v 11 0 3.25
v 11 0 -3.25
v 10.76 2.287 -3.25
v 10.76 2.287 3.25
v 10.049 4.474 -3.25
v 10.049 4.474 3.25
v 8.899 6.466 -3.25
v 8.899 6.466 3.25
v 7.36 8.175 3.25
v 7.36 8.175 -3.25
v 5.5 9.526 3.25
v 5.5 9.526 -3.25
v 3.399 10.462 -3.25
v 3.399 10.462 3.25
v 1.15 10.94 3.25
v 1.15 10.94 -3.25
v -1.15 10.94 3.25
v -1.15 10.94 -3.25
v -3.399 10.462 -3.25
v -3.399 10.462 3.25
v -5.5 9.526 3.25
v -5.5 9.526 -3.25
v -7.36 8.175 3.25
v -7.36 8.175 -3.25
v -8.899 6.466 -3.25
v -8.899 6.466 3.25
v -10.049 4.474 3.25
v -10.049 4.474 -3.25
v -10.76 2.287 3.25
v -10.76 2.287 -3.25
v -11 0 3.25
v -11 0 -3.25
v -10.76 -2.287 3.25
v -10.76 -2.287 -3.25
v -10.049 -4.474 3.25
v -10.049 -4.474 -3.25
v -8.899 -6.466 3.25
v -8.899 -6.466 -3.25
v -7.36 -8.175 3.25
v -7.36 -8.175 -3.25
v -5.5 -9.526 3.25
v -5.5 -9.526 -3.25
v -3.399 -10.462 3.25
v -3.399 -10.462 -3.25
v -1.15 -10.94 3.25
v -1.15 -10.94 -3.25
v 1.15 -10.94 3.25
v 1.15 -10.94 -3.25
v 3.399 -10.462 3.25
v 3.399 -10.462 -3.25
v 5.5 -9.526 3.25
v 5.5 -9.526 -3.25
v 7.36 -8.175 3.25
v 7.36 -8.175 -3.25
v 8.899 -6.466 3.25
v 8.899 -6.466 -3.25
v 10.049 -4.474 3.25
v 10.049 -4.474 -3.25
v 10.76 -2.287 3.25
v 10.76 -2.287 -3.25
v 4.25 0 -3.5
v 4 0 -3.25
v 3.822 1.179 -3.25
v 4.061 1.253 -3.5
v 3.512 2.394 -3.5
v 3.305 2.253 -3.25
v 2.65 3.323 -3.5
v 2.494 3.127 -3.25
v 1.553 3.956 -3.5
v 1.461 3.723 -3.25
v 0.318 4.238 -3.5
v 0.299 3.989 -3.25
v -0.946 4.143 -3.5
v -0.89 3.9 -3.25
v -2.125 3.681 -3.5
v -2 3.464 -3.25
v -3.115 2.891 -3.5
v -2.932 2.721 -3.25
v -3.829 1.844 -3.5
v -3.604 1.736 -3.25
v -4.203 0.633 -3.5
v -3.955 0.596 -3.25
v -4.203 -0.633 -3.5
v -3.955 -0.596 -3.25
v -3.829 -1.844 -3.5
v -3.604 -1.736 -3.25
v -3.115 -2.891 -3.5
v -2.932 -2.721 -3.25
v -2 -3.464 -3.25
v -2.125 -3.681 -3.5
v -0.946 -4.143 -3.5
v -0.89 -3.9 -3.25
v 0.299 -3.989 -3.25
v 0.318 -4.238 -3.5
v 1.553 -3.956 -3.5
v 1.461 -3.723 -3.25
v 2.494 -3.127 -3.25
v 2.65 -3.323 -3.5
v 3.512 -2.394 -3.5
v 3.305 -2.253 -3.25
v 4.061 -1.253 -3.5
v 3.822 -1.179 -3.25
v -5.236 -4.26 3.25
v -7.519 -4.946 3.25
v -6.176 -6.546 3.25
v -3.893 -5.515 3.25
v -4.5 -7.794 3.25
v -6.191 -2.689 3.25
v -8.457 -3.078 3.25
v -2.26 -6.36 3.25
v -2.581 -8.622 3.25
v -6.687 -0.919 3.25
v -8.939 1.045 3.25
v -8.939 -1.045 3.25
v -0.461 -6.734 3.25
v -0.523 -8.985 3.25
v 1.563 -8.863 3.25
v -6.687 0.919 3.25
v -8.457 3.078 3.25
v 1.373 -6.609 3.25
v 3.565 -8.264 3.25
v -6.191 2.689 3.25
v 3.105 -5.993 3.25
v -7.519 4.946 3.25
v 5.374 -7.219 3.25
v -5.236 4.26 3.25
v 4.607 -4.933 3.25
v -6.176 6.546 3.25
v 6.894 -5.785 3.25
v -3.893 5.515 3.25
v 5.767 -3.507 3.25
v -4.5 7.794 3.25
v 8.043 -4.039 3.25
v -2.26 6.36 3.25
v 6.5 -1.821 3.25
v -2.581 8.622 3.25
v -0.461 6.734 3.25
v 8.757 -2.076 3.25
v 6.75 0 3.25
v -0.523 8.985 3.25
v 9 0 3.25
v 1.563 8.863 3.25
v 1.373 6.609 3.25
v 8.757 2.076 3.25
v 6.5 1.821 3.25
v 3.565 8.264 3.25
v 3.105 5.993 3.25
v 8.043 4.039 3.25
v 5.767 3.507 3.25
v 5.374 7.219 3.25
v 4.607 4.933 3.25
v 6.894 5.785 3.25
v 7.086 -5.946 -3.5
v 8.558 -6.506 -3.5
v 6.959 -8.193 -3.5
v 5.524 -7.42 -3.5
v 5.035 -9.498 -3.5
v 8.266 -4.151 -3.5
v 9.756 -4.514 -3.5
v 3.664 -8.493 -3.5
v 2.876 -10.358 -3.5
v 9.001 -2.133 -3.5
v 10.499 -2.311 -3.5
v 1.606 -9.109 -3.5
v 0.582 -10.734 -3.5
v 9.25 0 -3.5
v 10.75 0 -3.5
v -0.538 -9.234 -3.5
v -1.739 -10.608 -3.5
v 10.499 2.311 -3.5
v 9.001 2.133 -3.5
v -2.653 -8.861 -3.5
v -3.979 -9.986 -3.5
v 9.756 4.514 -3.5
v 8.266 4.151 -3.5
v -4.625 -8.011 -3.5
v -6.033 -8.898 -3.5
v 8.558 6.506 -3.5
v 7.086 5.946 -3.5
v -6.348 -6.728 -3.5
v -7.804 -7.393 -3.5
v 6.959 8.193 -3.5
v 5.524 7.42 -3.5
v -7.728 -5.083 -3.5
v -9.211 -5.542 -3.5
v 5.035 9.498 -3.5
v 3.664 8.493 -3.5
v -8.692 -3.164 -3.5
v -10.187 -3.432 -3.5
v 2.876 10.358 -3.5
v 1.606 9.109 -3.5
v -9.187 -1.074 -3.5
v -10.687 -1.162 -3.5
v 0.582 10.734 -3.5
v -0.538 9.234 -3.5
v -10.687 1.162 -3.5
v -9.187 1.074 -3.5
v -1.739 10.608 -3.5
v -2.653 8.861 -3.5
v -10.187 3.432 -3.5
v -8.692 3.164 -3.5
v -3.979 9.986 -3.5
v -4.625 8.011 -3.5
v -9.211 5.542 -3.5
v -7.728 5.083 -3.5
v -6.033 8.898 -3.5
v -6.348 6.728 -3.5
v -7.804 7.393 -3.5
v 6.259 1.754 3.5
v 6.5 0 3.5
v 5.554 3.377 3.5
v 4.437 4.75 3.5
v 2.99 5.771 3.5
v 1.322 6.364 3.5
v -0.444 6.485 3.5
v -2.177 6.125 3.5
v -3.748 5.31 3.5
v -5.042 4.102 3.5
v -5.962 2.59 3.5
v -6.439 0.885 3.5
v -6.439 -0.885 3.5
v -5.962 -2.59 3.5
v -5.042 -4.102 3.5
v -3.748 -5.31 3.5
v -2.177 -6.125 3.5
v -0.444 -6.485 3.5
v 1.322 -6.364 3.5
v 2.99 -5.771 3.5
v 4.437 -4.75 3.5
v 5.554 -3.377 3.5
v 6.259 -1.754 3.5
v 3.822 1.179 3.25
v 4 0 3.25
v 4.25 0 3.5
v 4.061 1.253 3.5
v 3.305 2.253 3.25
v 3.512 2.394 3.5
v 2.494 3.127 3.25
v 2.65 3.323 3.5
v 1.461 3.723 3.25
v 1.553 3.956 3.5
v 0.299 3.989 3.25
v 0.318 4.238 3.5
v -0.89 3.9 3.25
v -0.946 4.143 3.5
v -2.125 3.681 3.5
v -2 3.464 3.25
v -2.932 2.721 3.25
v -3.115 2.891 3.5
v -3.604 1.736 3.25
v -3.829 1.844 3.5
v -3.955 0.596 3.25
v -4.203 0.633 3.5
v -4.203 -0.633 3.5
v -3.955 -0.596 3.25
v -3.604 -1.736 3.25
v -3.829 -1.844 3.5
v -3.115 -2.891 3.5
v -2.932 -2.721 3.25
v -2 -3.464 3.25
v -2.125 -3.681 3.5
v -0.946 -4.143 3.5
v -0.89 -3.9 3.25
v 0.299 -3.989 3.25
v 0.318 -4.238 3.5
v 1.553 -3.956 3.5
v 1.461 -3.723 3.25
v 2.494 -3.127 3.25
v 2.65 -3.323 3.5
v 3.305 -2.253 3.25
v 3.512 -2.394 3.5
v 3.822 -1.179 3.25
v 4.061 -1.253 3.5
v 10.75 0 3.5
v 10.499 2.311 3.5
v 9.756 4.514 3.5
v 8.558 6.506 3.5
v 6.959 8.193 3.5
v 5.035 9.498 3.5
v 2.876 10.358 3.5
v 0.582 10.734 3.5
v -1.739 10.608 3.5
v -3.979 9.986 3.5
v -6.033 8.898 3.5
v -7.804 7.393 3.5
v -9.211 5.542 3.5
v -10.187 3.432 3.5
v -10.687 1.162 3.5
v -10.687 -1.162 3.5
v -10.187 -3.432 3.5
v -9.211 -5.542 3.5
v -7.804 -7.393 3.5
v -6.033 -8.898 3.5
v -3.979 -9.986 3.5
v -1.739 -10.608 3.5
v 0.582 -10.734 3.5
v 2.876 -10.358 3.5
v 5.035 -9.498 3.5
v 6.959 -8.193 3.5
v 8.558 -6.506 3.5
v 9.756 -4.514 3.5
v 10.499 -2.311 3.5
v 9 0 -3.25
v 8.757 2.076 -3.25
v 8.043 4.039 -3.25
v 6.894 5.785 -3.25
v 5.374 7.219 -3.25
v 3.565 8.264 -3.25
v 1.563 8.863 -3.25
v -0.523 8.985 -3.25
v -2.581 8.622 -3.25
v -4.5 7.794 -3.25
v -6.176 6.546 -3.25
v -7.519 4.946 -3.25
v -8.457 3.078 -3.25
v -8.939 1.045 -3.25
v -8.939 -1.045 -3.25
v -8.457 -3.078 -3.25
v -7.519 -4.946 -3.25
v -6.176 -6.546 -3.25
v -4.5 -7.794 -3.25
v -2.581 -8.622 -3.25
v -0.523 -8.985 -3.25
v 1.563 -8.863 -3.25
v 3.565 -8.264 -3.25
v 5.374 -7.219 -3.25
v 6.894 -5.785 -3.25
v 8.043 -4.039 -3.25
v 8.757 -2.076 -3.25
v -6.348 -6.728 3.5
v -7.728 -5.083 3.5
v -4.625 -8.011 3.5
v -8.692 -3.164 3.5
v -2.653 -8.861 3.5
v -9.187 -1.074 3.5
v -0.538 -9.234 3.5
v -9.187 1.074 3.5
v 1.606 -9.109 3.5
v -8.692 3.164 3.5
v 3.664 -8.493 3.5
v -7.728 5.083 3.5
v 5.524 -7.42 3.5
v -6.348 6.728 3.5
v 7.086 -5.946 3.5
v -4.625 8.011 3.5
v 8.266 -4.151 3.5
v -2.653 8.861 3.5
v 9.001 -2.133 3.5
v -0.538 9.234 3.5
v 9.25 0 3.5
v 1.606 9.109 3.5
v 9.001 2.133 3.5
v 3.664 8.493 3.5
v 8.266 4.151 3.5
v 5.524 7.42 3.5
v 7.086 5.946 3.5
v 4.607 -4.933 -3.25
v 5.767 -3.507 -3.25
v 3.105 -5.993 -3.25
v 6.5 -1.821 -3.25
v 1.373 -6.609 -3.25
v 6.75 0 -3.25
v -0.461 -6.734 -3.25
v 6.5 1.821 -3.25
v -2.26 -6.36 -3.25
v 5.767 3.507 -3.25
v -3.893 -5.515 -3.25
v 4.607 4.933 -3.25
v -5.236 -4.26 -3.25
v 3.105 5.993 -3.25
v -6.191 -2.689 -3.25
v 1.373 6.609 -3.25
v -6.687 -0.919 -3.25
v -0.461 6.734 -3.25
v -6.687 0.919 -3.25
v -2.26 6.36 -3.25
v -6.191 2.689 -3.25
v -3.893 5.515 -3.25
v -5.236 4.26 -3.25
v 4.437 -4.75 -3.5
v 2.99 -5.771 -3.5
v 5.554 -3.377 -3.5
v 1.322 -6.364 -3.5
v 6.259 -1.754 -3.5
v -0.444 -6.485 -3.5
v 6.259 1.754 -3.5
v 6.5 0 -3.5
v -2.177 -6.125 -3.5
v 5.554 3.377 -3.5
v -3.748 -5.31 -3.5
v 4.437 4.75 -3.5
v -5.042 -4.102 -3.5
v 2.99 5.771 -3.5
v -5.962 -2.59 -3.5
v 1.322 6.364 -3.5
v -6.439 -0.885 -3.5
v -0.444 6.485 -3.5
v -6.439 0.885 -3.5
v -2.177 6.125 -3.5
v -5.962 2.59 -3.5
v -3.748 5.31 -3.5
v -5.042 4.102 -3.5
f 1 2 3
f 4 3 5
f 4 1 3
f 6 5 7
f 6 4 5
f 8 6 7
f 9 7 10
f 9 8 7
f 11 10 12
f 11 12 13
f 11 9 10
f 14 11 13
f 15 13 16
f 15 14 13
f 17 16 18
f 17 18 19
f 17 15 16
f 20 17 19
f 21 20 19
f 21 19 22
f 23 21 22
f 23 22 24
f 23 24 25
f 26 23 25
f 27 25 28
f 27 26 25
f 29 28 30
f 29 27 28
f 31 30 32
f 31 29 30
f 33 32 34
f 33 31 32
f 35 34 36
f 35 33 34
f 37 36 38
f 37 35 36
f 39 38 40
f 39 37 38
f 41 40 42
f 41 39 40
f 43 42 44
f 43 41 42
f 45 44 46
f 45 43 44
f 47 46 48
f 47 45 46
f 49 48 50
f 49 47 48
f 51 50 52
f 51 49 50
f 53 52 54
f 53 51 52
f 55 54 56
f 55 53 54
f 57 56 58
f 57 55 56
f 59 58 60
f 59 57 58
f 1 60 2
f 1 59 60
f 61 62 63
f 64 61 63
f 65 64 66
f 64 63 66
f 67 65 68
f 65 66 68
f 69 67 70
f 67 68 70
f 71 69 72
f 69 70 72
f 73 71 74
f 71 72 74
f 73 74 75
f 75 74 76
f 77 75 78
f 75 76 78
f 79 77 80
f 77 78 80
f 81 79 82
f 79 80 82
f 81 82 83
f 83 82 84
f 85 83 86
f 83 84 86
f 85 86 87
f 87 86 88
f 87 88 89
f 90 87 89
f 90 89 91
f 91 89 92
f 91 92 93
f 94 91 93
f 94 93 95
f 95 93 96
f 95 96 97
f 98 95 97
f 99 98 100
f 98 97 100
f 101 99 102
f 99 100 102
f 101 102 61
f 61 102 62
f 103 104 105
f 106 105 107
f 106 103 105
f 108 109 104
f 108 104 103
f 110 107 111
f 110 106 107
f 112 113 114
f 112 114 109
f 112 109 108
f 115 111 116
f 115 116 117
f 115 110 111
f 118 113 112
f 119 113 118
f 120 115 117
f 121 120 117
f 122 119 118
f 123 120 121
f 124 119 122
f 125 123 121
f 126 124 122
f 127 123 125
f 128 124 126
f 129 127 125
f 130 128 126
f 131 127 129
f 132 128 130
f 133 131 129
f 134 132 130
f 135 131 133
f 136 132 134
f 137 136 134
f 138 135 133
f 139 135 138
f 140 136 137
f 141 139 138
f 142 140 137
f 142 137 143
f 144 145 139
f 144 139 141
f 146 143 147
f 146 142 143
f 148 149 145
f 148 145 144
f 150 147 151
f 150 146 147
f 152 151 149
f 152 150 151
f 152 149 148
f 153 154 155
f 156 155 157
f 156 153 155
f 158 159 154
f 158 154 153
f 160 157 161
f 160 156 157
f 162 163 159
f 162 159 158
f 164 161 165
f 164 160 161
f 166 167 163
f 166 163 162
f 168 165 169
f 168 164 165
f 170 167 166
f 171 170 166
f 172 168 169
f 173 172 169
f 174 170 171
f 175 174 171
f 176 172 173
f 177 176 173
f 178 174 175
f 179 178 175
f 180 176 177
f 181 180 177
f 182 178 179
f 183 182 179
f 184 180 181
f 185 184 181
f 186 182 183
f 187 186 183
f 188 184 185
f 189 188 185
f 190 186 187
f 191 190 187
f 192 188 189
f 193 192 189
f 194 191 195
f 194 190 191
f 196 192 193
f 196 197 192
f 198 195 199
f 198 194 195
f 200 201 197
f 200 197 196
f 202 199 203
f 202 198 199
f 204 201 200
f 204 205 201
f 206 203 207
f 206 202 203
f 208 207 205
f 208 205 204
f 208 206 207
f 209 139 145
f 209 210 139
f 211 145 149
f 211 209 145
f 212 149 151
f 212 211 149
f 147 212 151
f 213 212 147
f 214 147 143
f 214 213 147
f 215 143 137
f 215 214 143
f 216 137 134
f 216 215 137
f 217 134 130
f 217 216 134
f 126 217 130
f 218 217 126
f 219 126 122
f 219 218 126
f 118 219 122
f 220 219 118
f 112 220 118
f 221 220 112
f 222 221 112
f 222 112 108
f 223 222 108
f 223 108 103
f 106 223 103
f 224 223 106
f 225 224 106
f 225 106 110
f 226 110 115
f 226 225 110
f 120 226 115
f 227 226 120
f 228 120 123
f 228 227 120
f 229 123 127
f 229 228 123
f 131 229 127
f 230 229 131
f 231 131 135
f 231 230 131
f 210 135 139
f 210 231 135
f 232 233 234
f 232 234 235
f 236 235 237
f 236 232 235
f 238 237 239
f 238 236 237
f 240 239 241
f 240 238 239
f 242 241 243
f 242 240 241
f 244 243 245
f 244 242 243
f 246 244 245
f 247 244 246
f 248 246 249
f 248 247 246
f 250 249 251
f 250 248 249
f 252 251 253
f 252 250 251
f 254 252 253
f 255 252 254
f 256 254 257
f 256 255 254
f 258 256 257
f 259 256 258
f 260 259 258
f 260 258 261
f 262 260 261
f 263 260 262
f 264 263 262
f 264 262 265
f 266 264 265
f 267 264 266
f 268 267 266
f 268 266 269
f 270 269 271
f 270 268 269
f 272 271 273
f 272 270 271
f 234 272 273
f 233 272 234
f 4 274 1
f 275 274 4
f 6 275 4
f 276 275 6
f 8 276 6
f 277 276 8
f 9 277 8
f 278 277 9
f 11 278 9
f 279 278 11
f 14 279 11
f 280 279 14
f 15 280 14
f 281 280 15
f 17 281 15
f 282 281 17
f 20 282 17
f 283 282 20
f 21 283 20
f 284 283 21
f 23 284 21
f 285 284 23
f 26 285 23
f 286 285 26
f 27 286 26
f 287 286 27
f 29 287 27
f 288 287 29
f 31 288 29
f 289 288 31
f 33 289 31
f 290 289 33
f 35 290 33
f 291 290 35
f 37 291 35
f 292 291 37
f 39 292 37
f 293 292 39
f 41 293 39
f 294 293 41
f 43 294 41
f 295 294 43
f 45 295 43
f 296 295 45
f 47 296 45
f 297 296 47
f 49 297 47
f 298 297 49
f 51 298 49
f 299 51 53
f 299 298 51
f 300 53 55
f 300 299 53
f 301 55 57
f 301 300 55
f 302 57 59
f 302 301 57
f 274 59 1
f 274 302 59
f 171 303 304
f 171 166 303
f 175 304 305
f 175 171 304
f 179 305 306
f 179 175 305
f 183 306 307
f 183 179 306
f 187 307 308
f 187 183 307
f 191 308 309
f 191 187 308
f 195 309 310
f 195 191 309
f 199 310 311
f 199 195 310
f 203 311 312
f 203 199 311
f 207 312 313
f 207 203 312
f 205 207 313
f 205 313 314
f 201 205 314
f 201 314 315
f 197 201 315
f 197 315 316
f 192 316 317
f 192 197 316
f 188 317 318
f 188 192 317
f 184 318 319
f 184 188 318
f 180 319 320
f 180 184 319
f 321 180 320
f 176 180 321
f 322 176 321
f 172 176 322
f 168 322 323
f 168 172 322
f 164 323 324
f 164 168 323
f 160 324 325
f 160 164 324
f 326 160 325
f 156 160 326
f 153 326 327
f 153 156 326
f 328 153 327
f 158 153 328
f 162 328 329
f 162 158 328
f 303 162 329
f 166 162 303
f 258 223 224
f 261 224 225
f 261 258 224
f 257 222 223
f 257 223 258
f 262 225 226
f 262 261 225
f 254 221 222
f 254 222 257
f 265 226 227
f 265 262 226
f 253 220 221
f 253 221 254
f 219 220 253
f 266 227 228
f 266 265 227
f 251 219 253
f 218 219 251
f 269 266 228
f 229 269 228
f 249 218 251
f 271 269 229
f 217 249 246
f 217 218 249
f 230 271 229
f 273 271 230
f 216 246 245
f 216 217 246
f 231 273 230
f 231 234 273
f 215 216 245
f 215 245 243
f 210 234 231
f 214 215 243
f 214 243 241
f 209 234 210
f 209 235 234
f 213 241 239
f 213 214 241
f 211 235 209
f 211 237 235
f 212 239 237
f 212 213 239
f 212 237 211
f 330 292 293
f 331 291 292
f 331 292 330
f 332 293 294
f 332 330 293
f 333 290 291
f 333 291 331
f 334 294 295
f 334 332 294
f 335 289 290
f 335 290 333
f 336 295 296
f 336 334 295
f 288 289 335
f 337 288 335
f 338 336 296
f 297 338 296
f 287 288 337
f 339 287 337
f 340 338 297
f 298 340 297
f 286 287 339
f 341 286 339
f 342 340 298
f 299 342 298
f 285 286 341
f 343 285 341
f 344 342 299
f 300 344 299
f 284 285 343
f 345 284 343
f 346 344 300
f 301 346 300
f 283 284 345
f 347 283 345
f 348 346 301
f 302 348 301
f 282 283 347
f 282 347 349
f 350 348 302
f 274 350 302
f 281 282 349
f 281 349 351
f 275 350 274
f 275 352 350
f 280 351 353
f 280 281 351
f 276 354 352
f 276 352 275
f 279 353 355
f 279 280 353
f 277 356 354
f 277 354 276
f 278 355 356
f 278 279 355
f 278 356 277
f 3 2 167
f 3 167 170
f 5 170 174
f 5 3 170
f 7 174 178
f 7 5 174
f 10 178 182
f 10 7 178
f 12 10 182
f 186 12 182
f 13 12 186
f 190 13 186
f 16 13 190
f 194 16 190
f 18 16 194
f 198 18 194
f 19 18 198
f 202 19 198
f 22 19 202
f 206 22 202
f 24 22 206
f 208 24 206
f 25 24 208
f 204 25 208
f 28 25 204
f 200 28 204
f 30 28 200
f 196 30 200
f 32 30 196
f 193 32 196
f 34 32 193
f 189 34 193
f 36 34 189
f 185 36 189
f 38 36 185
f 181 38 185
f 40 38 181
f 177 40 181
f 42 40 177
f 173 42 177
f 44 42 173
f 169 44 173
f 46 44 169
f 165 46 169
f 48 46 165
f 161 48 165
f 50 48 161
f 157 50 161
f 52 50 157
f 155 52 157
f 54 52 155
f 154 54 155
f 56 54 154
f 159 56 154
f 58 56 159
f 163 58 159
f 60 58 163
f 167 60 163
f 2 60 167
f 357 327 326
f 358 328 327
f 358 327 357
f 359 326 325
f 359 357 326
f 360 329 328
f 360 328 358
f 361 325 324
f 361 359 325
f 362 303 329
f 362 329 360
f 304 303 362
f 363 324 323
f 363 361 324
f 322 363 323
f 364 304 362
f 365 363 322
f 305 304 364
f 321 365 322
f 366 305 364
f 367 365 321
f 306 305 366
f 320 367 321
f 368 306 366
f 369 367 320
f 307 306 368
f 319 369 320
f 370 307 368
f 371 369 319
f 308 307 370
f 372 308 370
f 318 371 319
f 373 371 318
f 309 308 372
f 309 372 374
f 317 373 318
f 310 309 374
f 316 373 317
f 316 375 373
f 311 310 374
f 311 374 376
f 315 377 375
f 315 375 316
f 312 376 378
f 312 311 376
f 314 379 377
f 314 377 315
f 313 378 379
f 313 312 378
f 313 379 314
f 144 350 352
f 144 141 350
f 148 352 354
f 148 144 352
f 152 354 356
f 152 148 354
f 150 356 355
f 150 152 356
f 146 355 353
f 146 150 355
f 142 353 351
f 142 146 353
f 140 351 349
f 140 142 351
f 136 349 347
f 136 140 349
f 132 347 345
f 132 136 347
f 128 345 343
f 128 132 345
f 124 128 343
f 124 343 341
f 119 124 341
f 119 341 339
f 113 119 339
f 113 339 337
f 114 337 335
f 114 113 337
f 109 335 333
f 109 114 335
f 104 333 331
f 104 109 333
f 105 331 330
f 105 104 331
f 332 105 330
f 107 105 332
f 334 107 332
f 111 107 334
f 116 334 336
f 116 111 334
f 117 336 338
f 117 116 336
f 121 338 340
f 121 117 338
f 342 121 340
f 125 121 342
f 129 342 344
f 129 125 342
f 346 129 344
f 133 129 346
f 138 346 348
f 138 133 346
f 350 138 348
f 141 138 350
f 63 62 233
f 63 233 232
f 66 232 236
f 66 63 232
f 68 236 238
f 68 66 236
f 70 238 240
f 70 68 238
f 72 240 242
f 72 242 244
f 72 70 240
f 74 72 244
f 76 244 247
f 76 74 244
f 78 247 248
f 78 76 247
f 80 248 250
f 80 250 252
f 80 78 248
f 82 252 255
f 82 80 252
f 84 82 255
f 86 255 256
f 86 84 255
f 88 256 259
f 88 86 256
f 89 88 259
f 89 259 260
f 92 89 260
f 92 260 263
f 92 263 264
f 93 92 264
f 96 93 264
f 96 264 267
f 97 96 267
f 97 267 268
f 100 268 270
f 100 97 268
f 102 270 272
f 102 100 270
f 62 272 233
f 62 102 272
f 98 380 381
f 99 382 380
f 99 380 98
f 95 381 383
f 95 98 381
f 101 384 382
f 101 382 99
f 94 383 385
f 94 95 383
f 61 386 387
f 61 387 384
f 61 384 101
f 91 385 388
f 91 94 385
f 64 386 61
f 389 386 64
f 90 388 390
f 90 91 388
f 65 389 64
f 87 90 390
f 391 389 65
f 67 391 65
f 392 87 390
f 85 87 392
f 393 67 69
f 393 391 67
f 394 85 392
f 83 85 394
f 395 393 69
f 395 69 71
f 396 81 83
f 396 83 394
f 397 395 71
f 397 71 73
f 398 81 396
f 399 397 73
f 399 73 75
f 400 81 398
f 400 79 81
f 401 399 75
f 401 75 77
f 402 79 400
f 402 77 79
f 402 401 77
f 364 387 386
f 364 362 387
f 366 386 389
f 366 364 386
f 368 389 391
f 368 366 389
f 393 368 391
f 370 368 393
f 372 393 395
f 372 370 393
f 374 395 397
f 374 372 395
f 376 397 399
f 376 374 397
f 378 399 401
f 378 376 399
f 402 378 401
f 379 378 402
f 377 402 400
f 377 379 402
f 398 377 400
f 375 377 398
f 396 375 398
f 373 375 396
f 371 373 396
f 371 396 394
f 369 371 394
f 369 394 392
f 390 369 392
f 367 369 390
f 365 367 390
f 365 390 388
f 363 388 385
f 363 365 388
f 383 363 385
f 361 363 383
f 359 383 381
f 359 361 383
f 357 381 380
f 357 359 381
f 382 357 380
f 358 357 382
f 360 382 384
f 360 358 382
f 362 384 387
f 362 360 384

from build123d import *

# Parameters (mm, degrees)
CHAMFER_SIZE = 0.25


with BuildPart() as part:
    # Sketch → Revolution (revolve)
    with BuildSketch(Plane.XZ):
        Polygon((4, -3.5), (6.5, -3.5), (6.75, -3.25), (9, -3.25), (9.25, -3.5), (11, -3.5), (11, 3.5), (9.25, 3.5), (9, 3.25), (6.75, 3.25), (6.5, 3.5), (4, 3.5), align=None)
    revolve(axis=Axis((0, 0, 0), (0, 0, 1)))

    # Chamfer
    chamfer_edges = [part.edges().sort_by_distance(p)[0] for p in [
        (-11, 0, -3.5),
        (-4, 0, -3.5),
        (-11, 0, 3.5),
        (-4, 0, 3.5),
    ]]
    chamfer(chamfer_edges, length=CHAMFER_SIZE)


solid = part.part
